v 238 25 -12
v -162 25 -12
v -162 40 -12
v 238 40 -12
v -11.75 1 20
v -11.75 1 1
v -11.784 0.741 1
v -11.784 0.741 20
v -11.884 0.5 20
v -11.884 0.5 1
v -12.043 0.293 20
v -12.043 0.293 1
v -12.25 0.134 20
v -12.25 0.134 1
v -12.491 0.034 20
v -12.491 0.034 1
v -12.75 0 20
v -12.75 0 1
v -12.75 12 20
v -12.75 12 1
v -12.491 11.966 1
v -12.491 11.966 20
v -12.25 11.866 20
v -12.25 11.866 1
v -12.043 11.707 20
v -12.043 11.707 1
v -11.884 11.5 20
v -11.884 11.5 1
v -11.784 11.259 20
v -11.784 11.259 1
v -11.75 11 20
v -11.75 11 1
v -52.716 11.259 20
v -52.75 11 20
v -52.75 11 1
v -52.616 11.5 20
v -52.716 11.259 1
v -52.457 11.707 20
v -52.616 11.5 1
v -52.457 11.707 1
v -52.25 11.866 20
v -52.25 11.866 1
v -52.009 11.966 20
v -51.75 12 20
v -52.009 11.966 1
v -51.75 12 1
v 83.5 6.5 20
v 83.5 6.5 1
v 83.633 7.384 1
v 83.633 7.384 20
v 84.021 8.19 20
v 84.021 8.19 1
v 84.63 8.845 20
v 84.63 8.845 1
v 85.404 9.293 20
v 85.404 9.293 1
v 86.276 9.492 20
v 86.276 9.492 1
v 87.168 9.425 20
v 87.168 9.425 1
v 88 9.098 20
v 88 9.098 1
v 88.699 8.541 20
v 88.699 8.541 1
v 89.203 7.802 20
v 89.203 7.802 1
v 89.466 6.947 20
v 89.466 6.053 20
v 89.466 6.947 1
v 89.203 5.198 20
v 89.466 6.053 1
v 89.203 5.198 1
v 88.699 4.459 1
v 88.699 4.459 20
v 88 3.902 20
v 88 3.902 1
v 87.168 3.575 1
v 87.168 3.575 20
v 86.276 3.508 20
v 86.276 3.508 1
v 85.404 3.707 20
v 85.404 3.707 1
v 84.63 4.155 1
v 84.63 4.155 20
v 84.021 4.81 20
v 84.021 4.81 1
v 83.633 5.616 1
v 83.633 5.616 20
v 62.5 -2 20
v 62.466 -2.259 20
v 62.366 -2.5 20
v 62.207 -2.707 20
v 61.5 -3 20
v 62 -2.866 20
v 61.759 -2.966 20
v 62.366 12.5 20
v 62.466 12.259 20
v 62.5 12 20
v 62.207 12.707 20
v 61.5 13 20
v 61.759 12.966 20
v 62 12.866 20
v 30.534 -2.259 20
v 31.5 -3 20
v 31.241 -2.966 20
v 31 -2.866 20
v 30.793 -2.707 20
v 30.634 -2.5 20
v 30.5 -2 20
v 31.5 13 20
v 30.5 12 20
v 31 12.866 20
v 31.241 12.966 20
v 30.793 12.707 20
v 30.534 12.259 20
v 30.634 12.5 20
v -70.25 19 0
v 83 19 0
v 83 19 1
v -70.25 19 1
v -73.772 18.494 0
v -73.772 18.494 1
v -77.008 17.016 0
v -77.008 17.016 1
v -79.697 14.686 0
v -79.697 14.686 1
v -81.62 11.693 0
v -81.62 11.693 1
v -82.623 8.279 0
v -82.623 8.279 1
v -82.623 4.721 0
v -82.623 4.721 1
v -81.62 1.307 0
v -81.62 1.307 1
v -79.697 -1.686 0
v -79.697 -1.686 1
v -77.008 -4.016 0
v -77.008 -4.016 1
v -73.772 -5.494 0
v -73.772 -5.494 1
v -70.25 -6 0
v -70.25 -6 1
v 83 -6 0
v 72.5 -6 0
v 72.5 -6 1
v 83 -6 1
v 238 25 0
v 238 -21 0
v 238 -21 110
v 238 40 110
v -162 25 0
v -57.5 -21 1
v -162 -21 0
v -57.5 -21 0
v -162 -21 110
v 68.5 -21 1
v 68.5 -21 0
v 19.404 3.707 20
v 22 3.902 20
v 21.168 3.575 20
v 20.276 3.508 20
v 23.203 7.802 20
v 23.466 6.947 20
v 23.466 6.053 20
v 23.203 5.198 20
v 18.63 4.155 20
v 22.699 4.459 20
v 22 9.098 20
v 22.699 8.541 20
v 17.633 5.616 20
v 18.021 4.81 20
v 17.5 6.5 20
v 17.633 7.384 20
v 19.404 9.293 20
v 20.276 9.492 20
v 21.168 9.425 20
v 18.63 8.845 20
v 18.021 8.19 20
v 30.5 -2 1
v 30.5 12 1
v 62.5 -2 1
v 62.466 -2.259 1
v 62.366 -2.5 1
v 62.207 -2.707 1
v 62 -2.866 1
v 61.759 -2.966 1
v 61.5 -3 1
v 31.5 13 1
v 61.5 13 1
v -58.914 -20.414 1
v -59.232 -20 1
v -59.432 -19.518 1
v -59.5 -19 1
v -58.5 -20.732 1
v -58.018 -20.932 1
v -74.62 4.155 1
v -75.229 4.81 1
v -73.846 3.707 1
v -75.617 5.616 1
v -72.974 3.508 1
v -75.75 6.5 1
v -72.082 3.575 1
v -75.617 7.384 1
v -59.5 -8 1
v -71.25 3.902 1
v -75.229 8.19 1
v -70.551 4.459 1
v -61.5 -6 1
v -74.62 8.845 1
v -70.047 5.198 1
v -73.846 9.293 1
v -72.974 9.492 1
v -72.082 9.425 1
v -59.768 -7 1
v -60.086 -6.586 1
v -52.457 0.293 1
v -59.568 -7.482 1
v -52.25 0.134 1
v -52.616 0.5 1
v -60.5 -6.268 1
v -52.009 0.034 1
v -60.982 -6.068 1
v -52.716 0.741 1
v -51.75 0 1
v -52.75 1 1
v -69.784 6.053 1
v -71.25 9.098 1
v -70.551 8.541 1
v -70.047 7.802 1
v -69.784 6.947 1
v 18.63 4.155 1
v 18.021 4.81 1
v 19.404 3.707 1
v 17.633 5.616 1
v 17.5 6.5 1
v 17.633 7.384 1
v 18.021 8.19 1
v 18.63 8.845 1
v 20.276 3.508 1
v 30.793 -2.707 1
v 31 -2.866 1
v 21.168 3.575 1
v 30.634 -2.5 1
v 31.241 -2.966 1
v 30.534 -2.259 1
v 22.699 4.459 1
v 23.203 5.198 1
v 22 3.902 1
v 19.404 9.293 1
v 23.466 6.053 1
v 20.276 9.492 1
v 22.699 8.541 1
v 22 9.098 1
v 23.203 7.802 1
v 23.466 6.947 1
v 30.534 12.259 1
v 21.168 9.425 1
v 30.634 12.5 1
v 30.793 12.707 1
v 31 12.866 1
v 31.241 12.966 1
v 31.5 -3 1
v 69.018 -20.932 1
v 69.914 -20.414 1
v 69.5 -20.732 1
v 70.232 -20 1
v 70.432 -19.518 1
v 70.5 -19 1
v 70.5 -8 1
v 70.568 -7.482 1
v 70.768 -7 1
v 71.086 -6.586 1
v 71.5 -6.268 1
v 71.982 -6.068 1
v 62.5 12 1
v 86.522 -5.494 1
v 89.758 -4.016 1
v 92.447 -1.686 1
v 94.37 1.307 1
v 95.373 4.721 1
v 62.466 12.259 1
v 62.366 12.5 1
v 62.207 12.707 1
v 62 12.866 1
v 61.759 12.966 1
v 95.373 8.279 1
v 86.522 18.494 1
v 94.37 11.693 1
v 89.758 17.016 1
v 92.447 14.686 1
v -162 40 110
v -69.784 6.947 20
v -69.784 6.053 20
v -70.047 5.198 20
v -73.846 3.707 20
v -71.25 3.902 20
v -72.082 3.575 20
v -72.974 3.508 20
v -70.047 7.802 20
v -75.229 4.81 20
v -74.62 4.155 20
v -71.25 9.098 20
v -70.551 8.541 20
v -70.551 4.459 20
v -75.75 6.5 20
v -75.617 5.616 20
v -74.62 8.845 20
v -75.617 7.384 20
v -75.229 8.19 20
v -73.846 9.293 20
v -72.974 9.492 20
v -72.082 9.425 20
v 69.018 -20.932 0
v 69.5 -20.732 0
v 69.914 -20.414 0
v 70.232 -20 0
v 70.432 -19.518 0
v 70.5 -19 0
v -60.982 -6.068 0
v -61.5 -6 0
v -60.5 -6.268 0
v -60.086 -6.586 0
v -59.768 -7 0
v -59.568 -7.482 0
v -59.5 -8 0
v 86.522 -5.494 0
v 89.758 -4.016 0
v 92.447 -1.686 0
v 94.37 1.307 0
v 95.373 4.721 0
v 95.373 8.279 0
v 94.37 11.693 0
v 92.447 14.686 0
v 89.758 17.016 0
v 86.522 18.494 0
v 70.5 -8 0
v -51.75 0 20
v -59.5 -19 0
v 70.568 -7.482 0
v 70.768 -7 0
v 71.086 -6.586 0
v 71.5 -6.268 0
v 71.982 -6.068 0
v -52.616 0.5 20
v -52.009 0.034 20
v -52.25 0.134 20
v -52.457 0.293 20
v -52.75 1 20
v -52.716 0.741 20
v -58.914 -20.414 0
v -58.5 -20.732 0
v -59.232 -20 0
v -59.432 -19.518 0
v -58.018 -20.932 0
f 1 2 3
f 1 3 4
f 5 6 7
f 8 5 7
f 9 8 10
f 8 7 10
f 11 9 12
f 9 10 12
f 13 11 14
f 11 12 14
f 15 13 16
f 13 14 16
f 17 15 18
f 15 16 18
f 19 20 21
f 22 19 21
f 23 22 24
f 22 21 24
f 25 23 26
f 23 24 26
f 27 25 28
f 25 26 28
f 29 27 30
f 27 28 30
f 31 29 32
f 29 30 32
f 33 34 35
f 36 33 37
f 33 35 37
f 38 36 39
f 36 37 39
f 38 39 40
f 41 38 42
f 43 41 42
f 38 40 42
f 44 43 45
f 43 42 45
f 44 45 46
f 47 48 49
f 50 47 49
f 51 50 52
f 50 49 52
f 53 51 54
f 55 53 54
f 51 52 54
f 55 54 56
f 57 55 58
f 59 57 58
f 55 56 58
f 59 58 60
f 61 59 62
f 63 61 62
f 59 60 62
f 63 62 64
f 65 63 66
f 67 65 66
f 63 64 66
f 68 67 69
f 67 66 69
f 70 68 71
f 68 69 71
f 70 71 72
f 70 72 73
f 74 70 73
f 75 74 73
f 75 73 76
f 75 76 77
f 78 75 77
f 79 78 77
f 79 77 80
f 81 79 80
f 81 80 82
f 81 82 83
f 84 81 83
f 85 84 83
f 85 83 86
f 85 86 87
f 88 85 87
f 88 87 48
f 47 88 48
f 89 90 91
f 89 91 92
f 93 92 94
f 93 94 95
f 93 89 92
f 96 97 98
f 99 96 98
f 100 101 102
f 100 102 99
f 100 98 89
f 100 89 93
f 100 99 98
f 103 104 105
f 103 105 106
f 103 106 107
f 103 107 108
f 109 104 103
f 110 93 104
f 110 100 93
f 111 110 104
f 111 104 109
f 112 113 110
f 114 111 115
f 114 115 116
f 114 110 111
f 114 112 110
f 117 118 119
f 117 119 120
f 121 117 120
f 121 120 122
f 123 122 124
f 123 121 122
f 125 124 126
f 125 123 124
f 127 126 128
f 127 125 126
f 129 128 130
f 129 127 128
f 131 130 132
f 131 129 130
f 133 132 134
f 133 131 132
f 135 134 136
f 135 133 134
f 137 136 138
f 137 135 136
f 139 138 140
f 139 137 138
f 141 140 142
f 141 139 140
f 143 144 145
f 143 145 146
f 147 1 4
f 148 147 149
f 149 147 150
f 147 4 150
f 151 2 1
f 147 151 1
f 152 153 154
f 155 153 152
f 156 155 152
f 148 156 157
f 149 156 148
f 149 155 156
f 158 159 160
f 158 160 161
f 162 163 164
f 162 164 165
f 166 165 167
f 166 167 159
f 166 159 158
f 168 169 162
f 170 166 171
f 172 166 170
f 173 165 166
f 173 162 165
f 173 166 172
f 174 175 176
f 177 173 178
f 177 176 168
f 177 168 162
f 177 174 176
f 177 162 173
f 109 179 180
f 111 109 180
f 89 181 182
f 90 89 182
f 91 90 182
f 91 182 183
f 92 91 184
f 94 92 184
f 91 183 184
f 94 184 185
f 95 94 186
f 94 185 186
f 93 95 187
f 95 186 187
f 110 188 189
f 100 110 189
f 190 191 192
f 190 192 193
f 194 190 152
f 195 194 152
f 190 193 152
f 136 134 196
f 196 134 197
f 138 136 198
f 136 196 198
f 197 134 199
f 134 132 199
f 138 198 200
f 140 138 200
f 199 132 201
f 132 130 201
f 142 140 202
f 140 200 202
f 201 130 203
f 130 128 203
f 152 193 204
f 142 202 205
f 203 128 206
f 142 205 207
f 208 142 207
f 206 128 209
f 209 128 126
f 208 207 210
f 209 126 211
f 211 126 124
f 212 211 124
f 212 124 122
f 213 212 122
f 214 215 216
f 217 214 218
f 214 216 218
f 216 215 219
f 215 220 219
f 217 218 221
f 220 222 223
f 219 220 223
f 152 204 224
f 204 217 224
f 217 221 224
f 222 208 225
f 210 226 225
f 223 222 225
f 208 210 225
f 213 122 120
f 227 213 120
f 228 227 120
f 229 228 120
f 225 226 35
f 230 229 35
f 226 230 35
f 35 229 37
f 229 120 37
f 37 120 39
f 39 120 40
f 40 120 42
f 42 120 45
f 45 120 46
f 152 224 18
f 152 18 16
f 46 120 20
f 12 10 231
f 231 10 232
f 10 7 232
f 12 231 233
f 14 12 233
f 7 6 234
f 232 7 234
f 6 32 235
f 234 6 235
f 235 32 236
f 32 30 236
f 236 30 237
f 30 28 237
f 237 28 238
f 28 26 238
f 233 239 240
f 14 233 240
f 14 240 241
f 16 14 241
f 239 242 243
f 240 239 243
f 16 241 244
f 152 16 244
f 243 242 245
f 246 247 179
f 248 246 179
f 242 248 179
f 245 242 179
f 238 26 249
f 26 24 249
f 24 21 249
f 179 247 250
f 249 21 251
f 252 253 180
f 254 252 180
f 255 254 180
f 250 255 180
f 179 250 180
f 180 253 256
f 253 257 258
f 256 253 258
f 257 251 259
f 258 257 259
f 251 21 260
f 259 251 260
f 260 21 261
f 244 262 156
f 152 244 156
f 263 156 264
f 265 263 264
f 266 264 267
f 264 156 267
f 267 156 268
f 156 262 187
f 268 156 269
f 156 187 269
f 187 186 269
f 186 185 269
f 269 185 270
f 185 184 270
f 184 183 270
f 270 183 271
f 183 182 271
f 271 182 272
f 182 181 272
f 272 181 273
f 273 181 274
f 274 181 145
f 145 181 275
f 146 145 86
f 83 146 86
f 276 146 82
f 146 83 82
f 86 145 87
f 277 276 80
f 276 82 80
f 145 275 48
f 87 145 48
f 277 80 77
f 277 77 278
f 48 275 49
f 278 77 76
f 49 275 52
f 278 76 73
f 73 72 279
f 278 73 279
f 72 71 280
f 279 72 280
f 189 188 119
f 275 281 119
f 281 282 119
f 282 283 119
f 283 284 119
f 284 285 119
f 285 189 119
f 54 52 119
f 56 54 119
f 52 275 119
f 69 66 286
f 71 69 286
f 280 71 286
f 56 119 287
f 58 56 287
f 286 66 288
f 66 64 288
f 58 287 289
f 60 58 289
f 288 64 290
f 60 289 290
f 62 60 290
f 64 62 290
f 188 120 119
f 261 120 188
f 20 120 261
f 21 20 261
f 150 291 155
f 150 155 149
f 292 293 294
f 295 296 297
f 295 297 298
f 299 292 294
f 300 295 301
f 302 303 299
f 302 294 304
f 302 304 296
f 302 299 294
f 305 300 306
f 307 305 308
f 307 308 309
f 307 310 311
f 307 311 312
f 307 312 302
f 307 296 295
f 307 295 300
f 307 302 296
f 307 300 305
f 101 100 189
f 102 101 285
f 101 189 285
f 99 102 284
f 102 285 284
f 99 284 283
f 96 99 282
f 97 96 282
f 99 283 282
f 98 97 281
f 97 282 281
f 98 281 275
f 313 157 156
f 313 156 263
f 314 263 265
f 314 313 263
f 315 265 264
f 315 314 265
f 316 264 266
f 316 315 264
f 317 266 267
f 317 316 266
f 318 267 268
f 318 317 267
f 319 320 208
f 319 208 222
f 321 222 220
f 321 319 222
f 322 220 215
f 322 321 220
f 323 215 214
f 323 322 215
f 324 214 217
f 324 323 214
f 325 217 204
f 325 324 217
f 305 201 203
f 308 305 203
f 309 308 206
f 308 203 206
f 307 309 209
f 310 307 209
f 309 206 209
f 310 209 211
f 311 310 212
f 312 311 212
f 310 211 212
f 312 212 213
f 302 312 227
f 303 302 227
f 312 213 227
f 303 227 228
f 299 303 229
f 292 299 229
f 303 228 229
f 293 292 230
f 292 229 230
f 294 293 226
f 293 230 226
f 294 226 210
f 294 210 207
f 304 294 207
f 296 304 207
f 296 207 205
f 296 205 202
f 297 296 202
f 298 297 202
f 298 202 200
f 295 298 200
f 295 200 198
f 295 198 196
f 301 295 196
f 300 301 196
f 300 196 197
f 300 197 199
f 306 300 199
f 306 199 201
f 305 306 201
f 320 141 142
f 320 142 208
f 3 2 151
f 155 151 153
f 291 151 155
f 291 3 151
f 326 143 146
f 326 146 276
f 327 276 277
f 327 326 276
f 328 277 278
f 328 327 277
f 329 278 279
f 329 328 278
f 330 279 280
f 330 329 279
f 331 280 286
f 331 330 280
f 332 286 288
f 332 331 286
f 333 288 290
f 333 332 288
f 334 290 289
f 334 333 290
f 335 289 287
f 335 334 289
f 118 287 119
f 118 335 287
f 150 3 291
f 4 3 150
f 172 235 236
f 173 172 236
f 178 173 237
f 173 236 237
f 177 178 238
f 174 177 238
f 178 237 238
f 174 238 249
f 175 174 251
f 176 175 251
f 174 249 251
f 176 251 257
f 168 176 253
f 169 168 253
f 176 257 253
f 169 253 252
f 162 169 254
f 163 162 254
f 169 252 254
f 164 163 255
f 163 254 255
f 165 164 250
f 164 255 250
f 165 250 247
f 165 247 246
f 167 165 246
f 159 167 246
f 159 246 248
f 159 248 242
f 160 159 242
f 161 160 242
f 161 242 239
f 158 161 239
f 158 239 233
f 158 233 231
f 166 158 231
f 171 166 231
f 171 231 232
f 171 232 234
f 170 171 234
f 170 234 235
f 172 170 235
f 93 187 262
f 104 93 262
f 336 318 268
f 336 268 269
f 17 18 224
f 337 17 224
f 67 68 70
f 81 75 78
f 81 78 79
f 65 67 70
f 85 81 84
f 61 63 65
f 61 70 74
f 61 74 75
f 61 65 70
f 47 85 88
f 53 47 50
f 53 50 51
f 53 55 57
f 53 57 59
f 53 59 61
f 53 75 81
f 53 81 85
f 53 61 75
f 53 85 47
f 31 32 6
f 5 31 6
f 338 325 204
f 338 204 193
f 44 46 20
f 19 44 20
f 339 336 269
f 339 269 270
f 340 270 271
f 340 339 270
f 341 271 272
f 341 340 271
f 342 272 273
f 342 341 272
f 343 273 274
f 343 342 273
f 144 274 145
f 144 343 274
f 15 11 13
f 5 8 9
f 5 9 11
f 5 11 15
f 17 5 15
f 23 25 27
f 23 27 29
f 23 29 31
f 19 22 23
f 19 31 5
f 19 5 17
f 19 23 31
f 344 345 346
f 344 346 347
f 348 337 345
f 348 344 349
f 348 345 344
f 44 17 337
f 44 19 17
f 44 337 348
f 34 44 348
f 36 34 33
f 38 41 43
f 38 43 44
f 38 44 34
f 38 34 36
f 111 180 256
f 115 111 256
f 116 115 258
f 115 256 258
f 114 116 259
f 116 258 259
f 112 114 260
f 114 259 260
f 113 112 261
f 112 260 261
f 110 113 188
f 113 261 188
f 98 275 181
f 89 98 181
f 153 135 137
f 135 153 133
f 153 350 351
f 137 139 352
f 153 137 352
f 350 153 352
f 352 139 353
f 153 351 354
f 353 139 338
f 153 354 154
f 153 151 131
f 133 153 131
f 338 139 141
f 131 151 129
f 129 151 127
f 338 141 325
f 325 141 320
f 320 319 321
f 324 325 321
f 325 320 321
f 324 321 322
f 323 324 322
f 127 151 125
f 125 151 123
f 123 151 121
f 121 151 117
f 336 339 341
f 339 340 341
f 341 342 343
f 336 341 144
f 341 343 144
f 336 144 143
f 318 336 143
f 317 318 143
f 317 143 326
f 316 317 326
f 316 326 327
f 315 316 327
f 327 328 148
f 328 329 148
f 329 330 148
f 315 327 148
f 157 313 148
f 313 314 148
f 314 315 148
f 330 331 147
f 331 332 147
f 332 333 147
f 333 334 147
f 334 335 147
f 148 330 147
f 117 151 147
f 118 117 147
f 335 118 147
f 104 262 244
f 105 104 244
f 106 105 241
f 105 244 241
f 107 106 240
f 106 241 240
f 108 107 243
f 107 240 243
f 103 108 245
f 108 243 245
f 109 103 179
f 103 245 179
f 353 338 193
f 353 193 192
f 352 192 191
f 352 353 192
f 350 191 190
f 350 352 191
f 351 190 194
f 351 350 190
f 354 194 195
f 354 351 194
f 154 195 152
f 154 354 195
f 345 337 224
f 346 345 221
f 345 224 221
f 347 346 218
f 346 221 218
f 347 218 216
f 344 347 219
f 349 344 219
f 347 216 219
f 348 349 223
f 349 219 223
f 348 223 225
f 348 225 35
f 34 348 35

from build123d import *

# Parameters (mm, degrees)
ESQUISSE3_W      = 400
ESQUISSE3_H      = 40
EXTRUSION1_DEPTH = 110
ESQUISSE8_W      = 400
ESQUISSE8_H      = 122
EXTRUSION3_DEPTH = 15
ESQUISSE11_W     = 400
ESQUISSE11_H     = 110
EXTRUSION5_DEPTH = 6
ESQUISSE10_R     = 3
EXTRUSION4_DEPTH = 1
ESQUISSE12_R     = 3
EXTRUSION6_DEPTH = 20


with BuildPart() as part:
    # Esquisse3 → Extrusion1 (new body)
    with BuildSketch(Plane.XY):
        with Locations((38, 5)):
            Rectangle(ESQUISSE3_W, ESQUISSE3_H)
    extrude(amount=EXTRUSION1_DEPTH)

    # Esquisse8 → Extrusion3 (add)
    with BuildSketch(Plane(origin=(0, 25, 0), x_dir=(1, 0, 0), z_dir=(0, 1, 0))):
        with Locations((38, -49)):
            Rectangle(ESQUISSE8_W, ESQUISSE8_H)
    extrude(amount=EXTRUSION3_DEPTH)

    # Esquisse11 → Extrusion5 (add)
    with BuildSketch(Plane.XZ.offset(15)):
        with Locations((38, 55)):
            Rectangle(ESQUISSE11_W, ESQUISSE11_H)
    extrude(amount=EXTRUSION5_DEPTH)

    # Esquisse10 → Extrusion4 (cut)
    with BuildSketch(Plane(origin=(0, 0, 0), x_dir=(-1, 0, 0), z_dir=(0, 0, -1))):
        with BuildLine():
            Line((59.5, -8), (59.5, -19))
            ThreePointArc((59.5, -19), (58.914213562, -20.414213562), (57.5, -21))
            Line((57.5, -21), (-68.5, -21))
            ThreePointArc((-68.5, -21), (-69.914213562, -20.414213562), (-70.5, -19))
            Line((-70.5, -19), (-70.5, -8))
            ThreePointArc((-70.5, -8), (-71.085786438, -6.585786438), (-72.5, -6))
            Line((-72.5, -6), (-83, -6))
            ThreePointArc((-83, -6), (-95.5, 6.5), (-83, 19))
            Line((-83, 19), (70.25, 19))
            ThreePointArc((70.25, 19), (82.75, 6.5), (70.25, -6))
            Line((70.25, -6), (61.5, -6))
            ThreePointArc((61.5, -6), (60.085786438, -6.585786438), (59.5, -8))
        make_face()
        with Locations((-86.5, 6.5)):
            Circle(ESQUISSE10_R, mode=Mode.SUBTRACT)
        with Locations((-20.5, 6.5)):
            Circle(ESQUISSE10_R, mode=Mode.SUBTRACT)
        with Locations((72.75, 6.5)):
            Circle(ESQUISSE10_R, mode=Mode.SUBTRACT)
        with BuildLine():
            Line((-31.5, -3), (-61.5, -3))
            ThreePointArc((-61.5, -3), (-62.207106781, -2.707106781), (-62.5, -2))
            Line((-62.5, -2), (-62.5, 12))
            ThreePointArc((-62.5, 12), (-62.207106781, 12.707106781), (-61.5, 13))
            Line((-61.5, 13), (-31.5, 13))
            ThreePointArc((-31.5, 13), (-30.792893219, 12.707106781), (-30.5, 12))
            Line((-30.5, 12), (-30.5, -2))
            ThreePointArc((-30.5, -2), (-30.792893219, -2.707106781), (-31.5, -3))
        make_face(mode=Mode.SUBTRACT)
        with BuildLine():
            Line((51.75, 0), (12.75, 0))
            ThreePointArc((12.75, 0), (12.042893219, 0.292893219), (11.75, 1))
            Line((11.75, 1), (11.75, 11))
            ThreePointArc((11.75, 11), (12.042893219, 11.707106781), (12.75, 12))
            Line((12.75, 12), (51.75, 12))
            ThreePointArc((51.75, 12), (52.457106781, 11.707106781), (52.75, 11))
            Line((52.75, 11), (52.75, 1))
            ThreePointArc((52.75, 1), (52.457106781, 0.292893219), (51.75, 0))
        make_face(mode=Mode.SUBTRACT)
    extrude(amount=-EXTRUSION4_DEPTH, mode=Mode.SUBTRACT)

    # Esquisse12 → Extrusion6 (cut)
    with BuildSketch(Plane(origin=(0, 0, 0), x_dir=(-1, 0, 0), z_dir=(0, 0, -1))):
        with Locations((-86.5, 6.5)):
            Circle(ESQUISSE12_R)
        with Locations((-20.5, 6.5)):
            Circle(ESQUISSE12_R)
        with Locations((72.75, 6.5)):
            Circle(ESQUISSE12_R)
        with BuildLine():
            Line((-30.5, -2), (-30.5, 12))
            ThreePointArc((-30.5, 12), (-30.792893219, 12.707106781), (-31.5, 13))
            Line((-31.5, 13), (-61.5, 13))
            ThreePointArc((-61.5, 13), (-62.207106781, 12.707106781), (-62.5, 12))
            Line((-62.5, 12), (-62.5, -2))
            ThreePointArc((-62.5, -2), (-62.207106781, -2.707106781), (-61.5, -3))
            Line((-61.5, -3), (-31.5, -3))
            ThreePointArc((-31.5, -3), (-30.792893219, -2.707106781), (-30.5, -2))
        make_face()
        with BuildLine():
            Line((52.75, 1), (52.75, 11))
            ThreePointArc((52.75, 11), (52.457106781, 11.707106781), (51.75, 12))
            Line((51.75, 12), (12.75, 12))
            ThreePointArc((12.75, 12), (12.042893219, 11.707106781), (11.75, 11))
            Line((11.75, 11), (11.75, 1))
            ThreePointArc((11.75, 1), (12.042893219, 0.292893219), (12.75, 0))
            Line((12.75, 0), (51.75, 0))
            ThreePointArc((51.75, 0), (52.457106781, 0.292893219), (52.75, 1))
        make_face()
    extrude(amount=-EXTRUSION6_DEPTH, mode=Mode.SUBTRACT)


solid = part.part
